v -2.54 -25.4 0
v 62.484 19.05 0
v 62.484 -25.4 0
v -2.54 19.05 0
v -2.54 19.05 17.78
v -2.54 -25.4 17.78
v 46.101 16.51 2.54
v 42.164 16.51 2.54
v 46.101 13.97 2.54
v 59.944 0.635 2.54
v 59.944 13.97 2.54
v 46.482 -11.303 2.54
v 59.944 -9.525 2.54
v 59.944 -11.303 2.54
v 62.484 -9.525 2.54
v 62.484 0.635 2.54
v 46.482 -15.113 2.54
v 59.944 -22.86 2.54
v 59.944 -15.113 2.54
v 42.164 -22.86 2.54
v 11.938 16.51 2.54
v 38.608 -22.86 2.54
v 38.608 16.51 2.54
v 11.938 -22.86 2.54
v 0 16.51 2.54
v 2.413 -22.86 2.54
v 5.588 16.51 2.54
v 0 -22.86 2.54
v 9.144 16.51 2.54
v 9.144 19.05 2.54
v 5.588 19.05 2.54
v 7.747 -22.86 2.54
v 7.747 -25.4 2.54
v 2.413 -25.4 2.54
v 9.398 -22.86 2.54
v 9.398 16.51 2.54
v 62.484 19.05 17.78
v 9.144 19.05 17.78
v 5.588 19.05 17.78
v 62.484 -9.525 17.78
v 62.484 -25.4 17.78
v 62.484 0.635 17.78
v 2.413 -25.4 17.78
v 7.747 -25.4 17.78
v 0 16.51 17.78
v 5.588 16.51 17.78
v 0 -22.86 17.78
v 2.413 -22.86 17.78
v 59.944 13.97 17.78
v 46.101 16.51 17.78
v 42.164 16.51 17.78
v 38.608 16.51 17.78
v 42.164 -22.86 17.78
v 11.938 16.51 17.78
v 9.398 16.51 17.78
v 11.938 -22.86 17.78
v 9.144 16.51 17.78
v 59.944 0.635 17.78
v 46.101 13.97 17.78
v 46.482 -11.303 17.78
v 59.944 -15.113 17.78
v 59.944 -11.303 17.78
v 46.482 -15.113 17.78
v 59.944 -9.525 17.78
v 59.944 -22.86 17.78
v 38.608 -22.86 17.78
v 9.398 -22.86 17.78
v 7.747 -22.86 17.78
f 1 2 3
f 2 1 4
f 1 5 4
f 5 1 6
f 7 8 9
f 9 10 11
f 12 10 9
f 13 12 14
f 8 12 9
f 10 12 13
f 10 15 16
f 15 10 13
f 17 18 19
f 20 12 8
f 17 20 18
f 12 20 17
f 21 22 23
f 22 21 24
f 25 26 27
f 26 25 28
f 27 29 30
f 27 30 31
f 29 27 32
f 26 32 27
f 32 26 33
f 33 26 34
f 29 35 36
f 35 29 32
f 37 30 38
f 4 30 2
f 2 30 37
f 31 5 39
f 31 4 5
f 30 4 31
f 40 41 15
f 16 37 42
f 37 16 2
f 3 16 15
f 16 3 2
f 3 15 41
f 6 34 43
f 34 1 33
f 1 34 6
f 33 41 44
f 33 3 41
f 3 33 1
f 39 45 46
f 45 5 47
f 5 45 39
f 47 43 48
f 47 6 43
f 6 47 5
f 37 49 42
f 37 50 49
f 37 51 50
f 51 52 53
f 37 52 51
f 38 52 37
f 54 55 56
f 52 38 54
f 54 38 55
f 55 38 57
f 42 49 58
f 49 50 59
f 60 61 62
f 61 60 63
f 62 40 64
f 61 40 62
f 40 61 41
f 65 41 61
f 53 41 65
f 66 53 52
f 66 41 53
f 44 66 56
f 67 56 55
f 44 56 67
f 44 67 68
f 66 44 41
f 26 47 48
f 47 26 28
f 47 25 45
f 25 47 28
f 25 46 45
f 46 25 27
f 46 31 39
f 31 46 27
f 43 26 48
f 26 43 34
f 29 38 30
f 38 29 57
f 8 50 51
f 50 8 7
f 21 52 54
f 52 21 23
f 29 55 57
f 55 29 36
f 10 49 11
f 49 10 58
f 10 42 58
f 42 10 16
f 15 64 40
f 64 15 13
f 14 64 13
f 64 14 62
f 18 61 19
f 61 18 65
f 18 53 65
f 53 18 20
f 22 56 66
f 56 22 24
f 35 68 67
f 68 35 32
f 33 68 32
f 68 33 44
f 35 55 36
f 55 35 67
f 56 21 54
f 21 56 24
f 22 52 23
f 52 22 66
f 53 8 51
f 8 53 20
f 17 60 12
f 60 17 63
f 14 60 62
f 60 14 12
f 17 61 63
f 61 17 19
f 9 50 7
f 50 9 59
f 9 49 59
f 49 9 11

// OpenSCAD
ViewScale = [0.0254, 0.0254, 0.0254];

module modelUSB()
{
    color("CornflowerBlue", 1.0)
    union() {
    // pcb + wires
    linear_extrude(110)
    square([720, 1110], center=true);

    // USB connector
    translate([0, 0, 110])
    linear_extrude(180)
    translate([0, 741/2+1110/2-128])
    square([476, 741], center=true);

    // header pins
    translate([0, 0, 110])
    linear_extrude(230)
    translate([0, -1110/2+65])
    square([600, 130], center=true);

    // connectors
    translate([0, 0, 110+130])
    linear_extrude(105)
    translate([0, -1110/2-175])
    square([600, 350], center=true);
    }
}

module modelESP8266()
{
    color("CornflowerBlue", 1,0)
    union() {
    // pcb
    linear_extrude(130)
    square([1005, 1520], center=true);

    // long header row
    translate([1005/2-50-60, 0, 130])
    linear_extrude(600)
    square([100, 1005], center=true);

    // long header row
    translate([-1005/2+50+60, 0, 130])
    linear_extrude(600)
    square([100, 1005], center=true);

    // short header row
    translate([0, 1520/2-50-40, 130])
    linear_extrude(600)
    square([630, 100], center=true);

    // wifi module
    translate([0, -(1520-930)/2, 130])
    linear_extrude(40)
    square([630, 930], center=true);
    }
}

module modelButtons()
{
    color("CornflowerBlue", 1.0)
    union() {
    // pcb
    translate([0, 0, 0])
    linear_extrude(110)
    square([1120, 810], center=true);

    // short header row
    translate([-310-100+170, -310-50+200, 110])
    linear_extrude(600)
    square([310, 100], center=true);

    // buttons
    translate([0, -520/2+810/2, 110])
    linear_extrude(470)
    square([980, 520], center=true);
    }
}

module models()
{
    translate([0, 0, 100]) {
    translate([0, -330, 360])
    rotate([0, -90, 180])
    modelUSB();
    translate([1000, -140, 0])
    modelESP8266();
    translate([1700, 60, 810/2])
    rotate([90, 0, 90])
    modelButtons();}

}

scale(ViewScale)
{
    //models();
    translate([1180, -125, 0])
    linear_extrude(100)
    square([2560, 1750], center=true);

    translate([1180, -125, 100])
    {
    linear_extrude(600)
    difference() {
        square([2560, 1750], center=true);
        square([2360, 1550], center=true);
        // USB connector cutout
        translate([-980, -800, 0])
        square([210, 200], center=true);
        // USB headers cutout
        translate([-890, 800, 0])
        square([140, 200], center=true);
        // Button headers cutout
        translate([1220, -50, 0])
        square([120, 400], center=true);
    }}

    // Between USB and ESP
    translate([420, -125, 100])
    linear_extrude(600)
    square([100, 1550], center=true);

    // Between ESP and buttons
    translate([1590, -125, 100])
    linear_extrude(600)
    square([140, 1550], center=true);

    // Button SE corner
    translate([2105, -520, 100])
    linear_extrude(600)
    square([550, 150], center=true);

    // Button NE corner
    translate([2090, 600, 100])
    linear_extrude(600)
    square([550, 100], center=true);



}
